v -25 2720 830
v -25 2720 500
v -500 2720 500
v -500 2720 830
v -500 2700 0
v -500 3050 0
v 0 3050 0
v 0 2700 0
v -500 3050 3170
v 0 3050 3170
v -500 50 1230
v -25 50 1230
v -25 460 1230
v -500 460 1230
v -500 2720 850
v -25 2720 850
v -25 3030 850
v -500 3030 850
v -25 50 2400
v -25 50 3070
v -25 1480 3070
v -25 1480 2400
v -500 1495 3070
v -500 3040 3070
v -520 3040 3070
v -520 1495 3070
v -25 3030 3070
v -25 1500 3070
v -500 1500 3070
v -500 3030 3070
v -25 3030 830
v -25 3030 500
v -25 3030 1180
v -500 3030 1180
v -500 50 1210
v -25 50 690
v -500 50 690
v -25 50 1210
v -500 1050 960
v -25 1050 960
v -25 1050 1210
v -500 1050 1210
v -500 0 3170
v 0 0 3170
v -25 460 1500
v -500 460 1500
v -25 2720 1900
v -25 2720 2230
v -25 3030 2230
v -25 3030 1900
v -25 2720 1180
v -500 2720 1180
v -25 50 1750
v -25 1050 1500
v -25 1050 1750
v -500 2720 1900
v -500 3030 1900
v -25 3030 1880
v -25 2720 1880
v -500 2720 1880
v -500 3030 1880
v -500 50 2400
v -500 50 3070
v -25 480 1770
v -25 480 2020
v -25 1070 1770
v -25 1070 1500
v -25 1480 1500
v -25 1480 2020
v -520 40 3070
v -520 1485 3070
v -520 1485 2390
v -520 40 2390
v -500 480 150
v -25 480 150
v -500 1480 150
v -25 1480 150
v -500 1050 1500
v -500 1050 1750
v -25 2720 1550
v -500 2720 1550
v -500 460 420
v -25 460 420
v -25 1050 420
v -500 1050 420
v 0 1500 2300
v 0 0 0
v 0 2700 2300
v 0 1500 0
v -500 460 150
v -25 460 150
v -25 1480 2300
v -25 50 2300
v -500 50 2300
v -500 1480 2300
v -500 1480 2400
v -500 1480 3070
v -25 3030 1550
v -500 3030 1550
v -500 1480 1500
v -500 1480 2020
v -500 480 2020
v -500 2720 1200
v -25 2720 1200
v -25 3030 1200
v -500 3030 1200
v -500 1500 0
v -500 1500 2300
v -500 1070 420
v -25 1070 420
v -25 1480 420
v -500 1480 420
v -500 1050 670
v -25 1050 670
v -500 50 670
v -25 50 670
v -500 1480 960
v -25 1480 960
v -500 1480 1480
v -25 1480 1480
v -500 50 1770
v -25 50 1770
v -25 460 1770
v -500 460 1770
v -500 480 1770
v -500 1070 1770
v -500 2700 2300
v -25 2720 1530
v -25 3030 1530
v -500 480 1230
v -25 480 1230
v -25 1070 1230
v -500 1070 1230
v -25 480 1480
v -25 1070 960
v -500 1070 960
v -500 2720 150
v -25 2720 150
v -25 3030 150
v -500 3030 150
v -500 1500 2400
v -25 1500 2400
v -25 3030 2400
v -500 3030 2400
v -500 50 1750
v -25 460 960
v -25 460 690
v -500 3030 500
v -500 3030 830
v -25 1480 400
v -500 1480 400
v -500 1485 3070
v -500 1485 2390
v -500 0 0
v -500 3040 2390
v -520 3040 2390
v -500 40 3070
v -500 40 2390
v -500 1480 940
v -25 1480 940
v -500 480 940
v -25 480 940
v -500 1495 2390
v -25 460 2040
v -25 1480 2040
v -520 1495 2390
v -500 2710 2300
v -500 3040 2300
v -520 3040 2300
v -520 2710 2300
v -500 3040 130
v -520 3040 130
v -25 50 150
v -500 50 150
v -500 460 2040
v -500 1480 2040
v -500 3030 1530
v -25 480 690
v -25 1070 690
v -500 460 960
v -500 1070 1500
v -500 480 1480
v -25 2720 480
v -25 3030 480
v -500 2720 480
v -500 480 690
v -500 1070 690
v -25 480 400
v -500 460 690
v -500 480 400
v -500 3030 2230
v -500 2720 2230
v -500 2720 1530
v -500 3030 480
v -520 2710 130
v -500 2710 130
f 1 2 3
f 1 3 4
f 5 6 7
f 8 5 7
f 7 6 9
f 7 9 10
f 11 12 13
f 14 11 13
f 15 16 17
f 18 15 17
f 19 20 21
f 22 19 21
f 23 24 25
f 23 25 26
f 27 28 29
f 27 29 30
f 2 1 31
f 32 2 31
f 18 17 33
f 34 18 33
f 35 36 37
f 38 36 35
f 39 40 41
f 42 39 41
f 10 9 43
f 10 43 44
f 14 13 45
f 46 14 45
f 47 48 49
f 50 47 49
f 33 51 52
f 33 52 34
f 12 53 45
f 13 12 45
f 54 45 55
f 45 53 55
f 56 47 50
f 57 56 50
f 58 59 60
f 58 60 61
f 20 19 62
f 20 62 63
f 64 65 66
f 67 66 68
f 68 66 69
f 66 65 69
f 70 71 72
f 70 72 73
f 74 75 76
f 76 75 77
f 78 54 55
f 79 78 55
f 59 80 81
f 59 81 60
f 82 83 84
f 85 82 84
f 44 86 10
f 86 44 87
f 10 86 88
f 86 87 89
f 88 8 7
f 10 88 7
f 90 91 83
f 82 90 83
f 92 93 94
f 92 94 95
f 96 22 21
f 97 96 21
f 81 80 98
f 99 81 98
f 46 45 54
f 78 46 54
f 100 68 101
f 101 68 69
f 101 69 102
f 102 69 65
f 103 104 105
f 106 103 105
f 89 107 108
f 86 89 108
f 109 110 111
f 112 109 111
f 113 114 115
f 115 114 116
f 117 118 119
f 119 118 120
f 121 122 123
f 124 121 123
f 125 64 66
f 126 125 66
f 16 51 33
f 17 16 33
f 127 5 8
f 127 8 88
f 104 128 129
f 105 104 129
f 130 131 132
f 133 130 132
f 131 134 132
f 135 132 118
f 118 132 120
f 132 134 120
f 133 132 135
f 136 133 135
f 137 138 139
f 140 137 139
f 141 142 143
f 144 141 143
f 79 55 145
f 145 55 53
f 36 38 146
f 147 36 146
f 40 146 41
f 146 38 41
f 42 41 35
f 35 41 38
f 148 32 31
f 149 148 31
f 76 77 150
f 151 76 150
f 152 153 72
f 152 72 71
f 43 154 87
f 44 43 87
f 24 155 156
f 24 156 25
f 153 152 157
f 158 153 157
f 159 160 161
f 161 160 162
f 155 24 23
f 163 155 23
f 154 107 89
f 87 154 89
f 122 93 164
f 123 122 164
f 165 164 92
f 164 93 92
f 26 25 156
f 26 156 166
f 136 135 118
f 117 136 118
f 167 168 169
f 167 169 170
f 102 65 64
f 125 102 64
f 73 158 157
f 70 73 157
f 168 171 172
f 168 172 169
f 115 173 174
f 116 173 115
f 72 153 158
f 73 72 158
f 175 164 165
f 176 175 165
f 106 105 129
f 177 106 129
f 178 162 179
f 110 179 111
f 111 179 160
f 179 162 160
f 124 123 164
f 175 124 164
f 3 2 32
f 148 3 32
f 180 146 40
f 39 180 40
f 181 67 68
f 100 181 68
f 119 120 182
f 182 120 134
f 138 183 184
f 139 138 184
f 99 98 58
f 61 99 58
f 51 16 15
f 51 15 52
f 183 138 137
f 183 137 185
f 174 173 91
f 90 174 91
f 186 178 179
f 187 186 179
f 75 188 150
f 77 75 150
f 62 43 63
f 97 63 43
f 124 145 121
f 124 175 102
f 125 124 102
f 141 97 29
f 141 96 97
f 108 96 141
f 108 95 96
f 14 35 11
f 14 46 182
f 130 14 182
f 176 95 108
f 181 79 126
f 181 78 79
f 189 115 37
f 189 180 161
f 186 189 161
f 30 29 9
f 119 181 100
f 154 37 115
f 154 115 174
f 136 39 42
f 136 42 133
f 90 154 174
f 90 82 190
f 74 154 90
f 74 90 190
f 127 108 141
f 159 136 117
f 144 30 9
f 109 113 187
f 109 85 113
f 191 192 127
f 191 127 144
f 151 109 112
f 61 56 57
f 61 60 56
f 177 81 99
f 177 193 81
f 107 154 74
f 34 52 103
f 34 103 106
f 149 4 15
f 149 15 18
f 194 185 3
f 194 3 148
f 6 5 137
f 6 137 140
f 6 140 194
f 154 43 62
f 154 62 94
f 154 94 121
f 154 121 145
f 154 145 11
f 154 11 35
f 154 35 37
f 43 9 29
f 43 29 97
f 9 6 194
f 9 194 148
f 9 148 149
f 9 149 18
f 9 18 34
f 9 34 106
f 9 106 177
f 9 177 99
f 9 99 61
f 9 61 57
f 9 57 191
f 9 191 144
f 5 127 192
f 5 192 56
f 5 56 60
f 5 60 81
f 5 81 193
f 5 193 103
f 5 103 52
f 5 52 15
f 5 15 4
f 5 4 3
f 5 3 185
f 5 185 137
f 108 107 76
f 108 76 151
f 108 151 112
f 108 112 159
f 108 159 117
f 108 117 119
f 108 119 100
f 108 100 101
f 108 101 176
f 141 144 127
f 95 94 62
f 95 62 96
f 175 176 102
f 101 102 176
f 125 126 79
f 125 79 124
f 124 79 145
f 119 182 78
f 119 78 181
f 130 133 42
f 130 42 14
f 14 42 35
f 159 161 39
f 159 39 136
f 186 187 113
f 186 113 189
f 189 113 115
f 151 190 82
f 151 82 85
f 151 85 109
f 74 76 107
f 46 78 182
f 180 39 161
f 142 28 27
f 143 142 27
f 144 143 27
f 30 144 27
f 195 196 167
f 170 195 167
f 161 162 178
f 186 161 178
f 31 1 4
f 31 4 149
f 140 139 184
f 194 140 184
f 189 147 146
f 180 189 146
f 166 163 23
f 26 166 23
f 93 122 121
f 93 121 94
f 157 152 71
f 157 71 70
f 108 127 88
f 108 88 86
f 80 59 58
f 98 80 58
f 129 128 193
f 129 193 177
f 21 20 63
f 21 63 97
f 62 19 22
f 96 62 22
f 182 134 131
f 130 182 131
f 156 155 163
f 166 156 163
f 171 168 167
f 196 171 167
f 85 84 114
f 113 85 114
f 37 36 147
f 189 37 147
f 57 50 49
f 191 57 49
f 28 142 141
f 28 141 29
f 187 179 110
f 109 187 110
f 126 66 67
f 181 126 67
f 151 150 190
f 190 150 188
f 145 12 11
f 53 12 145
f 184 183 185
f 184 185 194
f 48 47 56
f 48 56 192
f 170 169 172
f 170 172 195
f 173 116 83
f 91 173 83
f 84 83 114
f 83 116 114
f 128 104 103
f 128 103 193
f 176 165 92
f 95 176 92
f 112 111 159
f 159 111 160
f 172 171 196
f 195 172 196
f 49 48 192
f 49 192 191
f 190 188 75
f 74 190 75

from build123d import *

# Parameters (mm, degrees)
F0_W      = 500
F0_H      = 3050
F1_DEPTH  = 3170
F3_W      = 1200
F3_H      = 2300
F4_DEPTH  = 500
F7_W      = 310
F7_H      = 330
F7_W_2    = 1530
F7_H_2    = 670
F8_DEPTH  = 475
F9_W      = 1430
F9_H      = 2150
F9_H_2    = 670
F10_DEPTH = 475.001
F12_DEPTH = 475
F13_W     = 330
F13_H     = 2170
F13_W_2   = 1545
F13_H_2   = 680
F13_W_3   = 1445
F14_DEPTH = 20


with BuildPart() as f1:
    # F0 (on Top) → F1 (new body)
    with BuildSketch(Plane.XY):
        with Locations((-250, 1525)):
            Rectangle(F0_W, F0_H)
    extrude(amount=F1_DEPTH)

    # F3 (on face) → F4 (cut, through all)
    with BuildSketch(Plane(origin=(-500, 0, 0), x_dir=(0, -1, 0), z_dir=(-1, 0, 0))):
        with Locations((-2100, 1150)):
            Rectangle(F3_W, F3_H)
    extrude(amount=-F4_DEPTH, mode=Mode.SUBTRACT)

    # F7 (on offset) → F8 (cut, through all)
    with BuildSketch(Plane.YZ.offset(-25)):
        with Locations((2875, 315)):
            Rectangle(F7_W, F7_H)
        with Locations((2875, 665)):
            Rectangle(F7_W, F7_H)
        with Locations((2875, 1015)):
            Rectangle(F7_W, F7_H)
        with Locations((2875, 1365)):
            Rectangle(F7_W, F7_H)
        with Locations((2875, 1715)):
            Rectangle(F7_W, F7_H)
        with Locations((2875, 2065)):
            Rectangle(F7_W, F7_H)
        with Locations((2265, 2735)):
            Rectangle(F7_W_2, F7_H_2)
    extrude(amount=-F8_DEPTH, mode=Mode.SUBTRACT)

    # F9 (on offset) → F10 (cut, through all)
    with BuildSketch(Plane.YZ.offset(-25)):
        with Locations((765, 1225)):
            Rectangle(F9_W, F9_H)
        with Locations((765, 2735)):
            Rectangle(F9_W, F9_H_2)
    extrude(amount=-F10_DEPTH, mode=Mode.SUBTRACT)

    # F11 (on face) → F12 (join, through all)
    with BuildSketch(Plane(origin=(-25, 0, 0), x_dir=(0, -1, 0), z_dir=(-1, 0, 0))):
        Polygon((-1070, 420), (-1480, 420), (-1480, 400), (-480, 400), (-480, 150), (-460, 150), (-460, 420), (-1050, 420), align=None)
        Polygon((-1070, 690), (-1070, 420), (-1050, 420), (-1050, 670), (-50, 670), (-50, 690), (-460, 690), (-480, 690), align=None)
        Polygon((-480, 940), (-480, 690), (-460, 690), (-460, 960), (-1050, 960), (-1070, 960), (-1480, 960), (-1480, 940), align=None)
        Polygon((-1070, 960), (-1050, 960), (-1050, 1210), (-50, 1210), (-50, 1230), (-460, 1230), (-480, 1230), (-1070, 1230), align=None)
        Polygon((-480, 1480), (-480, 1230), (-460, 1230), (-460, 1500), (-1050, 1500), (-1070, 1500), (-1480, 1500), (-1480, 1480), align=None)
        Polygon((-1070, 1500), (-1050, 1500), (-1050, 1750), (-50, 1750), (-50, 1770), (-460, 1770), (-480, 1770), (-1070, 1770), align=None)
        Polygon((-480, 2020), (-480, 1770), (-460, 1770), (-460, 2040), (-1480, 2040), (-1480, 2020), align=None)
    extrude(amount=F12_DEPTH)


with BuildPart() as f14:
    # F13 (on face) → F14 (new body)
    with BuildSketch(Plane(origin=(-500, 0, 0), x_dir=(0, -1, 0), z_dir=(-1, 0, 0))):
        with Locations((-2875, 1215)):
            Rectangle(F13_W, F13_H)
        with Locations((-2267.5, 2730)):
            Rectangle(F13_W_2, F13_H_2)
        with Locations((-762.5, 2730)):
            Rectangle(F13_W_3, F13_H_2)
    extrude(amount=F14_DEPTH)


solid = Compound([f1.part, f14.part])
